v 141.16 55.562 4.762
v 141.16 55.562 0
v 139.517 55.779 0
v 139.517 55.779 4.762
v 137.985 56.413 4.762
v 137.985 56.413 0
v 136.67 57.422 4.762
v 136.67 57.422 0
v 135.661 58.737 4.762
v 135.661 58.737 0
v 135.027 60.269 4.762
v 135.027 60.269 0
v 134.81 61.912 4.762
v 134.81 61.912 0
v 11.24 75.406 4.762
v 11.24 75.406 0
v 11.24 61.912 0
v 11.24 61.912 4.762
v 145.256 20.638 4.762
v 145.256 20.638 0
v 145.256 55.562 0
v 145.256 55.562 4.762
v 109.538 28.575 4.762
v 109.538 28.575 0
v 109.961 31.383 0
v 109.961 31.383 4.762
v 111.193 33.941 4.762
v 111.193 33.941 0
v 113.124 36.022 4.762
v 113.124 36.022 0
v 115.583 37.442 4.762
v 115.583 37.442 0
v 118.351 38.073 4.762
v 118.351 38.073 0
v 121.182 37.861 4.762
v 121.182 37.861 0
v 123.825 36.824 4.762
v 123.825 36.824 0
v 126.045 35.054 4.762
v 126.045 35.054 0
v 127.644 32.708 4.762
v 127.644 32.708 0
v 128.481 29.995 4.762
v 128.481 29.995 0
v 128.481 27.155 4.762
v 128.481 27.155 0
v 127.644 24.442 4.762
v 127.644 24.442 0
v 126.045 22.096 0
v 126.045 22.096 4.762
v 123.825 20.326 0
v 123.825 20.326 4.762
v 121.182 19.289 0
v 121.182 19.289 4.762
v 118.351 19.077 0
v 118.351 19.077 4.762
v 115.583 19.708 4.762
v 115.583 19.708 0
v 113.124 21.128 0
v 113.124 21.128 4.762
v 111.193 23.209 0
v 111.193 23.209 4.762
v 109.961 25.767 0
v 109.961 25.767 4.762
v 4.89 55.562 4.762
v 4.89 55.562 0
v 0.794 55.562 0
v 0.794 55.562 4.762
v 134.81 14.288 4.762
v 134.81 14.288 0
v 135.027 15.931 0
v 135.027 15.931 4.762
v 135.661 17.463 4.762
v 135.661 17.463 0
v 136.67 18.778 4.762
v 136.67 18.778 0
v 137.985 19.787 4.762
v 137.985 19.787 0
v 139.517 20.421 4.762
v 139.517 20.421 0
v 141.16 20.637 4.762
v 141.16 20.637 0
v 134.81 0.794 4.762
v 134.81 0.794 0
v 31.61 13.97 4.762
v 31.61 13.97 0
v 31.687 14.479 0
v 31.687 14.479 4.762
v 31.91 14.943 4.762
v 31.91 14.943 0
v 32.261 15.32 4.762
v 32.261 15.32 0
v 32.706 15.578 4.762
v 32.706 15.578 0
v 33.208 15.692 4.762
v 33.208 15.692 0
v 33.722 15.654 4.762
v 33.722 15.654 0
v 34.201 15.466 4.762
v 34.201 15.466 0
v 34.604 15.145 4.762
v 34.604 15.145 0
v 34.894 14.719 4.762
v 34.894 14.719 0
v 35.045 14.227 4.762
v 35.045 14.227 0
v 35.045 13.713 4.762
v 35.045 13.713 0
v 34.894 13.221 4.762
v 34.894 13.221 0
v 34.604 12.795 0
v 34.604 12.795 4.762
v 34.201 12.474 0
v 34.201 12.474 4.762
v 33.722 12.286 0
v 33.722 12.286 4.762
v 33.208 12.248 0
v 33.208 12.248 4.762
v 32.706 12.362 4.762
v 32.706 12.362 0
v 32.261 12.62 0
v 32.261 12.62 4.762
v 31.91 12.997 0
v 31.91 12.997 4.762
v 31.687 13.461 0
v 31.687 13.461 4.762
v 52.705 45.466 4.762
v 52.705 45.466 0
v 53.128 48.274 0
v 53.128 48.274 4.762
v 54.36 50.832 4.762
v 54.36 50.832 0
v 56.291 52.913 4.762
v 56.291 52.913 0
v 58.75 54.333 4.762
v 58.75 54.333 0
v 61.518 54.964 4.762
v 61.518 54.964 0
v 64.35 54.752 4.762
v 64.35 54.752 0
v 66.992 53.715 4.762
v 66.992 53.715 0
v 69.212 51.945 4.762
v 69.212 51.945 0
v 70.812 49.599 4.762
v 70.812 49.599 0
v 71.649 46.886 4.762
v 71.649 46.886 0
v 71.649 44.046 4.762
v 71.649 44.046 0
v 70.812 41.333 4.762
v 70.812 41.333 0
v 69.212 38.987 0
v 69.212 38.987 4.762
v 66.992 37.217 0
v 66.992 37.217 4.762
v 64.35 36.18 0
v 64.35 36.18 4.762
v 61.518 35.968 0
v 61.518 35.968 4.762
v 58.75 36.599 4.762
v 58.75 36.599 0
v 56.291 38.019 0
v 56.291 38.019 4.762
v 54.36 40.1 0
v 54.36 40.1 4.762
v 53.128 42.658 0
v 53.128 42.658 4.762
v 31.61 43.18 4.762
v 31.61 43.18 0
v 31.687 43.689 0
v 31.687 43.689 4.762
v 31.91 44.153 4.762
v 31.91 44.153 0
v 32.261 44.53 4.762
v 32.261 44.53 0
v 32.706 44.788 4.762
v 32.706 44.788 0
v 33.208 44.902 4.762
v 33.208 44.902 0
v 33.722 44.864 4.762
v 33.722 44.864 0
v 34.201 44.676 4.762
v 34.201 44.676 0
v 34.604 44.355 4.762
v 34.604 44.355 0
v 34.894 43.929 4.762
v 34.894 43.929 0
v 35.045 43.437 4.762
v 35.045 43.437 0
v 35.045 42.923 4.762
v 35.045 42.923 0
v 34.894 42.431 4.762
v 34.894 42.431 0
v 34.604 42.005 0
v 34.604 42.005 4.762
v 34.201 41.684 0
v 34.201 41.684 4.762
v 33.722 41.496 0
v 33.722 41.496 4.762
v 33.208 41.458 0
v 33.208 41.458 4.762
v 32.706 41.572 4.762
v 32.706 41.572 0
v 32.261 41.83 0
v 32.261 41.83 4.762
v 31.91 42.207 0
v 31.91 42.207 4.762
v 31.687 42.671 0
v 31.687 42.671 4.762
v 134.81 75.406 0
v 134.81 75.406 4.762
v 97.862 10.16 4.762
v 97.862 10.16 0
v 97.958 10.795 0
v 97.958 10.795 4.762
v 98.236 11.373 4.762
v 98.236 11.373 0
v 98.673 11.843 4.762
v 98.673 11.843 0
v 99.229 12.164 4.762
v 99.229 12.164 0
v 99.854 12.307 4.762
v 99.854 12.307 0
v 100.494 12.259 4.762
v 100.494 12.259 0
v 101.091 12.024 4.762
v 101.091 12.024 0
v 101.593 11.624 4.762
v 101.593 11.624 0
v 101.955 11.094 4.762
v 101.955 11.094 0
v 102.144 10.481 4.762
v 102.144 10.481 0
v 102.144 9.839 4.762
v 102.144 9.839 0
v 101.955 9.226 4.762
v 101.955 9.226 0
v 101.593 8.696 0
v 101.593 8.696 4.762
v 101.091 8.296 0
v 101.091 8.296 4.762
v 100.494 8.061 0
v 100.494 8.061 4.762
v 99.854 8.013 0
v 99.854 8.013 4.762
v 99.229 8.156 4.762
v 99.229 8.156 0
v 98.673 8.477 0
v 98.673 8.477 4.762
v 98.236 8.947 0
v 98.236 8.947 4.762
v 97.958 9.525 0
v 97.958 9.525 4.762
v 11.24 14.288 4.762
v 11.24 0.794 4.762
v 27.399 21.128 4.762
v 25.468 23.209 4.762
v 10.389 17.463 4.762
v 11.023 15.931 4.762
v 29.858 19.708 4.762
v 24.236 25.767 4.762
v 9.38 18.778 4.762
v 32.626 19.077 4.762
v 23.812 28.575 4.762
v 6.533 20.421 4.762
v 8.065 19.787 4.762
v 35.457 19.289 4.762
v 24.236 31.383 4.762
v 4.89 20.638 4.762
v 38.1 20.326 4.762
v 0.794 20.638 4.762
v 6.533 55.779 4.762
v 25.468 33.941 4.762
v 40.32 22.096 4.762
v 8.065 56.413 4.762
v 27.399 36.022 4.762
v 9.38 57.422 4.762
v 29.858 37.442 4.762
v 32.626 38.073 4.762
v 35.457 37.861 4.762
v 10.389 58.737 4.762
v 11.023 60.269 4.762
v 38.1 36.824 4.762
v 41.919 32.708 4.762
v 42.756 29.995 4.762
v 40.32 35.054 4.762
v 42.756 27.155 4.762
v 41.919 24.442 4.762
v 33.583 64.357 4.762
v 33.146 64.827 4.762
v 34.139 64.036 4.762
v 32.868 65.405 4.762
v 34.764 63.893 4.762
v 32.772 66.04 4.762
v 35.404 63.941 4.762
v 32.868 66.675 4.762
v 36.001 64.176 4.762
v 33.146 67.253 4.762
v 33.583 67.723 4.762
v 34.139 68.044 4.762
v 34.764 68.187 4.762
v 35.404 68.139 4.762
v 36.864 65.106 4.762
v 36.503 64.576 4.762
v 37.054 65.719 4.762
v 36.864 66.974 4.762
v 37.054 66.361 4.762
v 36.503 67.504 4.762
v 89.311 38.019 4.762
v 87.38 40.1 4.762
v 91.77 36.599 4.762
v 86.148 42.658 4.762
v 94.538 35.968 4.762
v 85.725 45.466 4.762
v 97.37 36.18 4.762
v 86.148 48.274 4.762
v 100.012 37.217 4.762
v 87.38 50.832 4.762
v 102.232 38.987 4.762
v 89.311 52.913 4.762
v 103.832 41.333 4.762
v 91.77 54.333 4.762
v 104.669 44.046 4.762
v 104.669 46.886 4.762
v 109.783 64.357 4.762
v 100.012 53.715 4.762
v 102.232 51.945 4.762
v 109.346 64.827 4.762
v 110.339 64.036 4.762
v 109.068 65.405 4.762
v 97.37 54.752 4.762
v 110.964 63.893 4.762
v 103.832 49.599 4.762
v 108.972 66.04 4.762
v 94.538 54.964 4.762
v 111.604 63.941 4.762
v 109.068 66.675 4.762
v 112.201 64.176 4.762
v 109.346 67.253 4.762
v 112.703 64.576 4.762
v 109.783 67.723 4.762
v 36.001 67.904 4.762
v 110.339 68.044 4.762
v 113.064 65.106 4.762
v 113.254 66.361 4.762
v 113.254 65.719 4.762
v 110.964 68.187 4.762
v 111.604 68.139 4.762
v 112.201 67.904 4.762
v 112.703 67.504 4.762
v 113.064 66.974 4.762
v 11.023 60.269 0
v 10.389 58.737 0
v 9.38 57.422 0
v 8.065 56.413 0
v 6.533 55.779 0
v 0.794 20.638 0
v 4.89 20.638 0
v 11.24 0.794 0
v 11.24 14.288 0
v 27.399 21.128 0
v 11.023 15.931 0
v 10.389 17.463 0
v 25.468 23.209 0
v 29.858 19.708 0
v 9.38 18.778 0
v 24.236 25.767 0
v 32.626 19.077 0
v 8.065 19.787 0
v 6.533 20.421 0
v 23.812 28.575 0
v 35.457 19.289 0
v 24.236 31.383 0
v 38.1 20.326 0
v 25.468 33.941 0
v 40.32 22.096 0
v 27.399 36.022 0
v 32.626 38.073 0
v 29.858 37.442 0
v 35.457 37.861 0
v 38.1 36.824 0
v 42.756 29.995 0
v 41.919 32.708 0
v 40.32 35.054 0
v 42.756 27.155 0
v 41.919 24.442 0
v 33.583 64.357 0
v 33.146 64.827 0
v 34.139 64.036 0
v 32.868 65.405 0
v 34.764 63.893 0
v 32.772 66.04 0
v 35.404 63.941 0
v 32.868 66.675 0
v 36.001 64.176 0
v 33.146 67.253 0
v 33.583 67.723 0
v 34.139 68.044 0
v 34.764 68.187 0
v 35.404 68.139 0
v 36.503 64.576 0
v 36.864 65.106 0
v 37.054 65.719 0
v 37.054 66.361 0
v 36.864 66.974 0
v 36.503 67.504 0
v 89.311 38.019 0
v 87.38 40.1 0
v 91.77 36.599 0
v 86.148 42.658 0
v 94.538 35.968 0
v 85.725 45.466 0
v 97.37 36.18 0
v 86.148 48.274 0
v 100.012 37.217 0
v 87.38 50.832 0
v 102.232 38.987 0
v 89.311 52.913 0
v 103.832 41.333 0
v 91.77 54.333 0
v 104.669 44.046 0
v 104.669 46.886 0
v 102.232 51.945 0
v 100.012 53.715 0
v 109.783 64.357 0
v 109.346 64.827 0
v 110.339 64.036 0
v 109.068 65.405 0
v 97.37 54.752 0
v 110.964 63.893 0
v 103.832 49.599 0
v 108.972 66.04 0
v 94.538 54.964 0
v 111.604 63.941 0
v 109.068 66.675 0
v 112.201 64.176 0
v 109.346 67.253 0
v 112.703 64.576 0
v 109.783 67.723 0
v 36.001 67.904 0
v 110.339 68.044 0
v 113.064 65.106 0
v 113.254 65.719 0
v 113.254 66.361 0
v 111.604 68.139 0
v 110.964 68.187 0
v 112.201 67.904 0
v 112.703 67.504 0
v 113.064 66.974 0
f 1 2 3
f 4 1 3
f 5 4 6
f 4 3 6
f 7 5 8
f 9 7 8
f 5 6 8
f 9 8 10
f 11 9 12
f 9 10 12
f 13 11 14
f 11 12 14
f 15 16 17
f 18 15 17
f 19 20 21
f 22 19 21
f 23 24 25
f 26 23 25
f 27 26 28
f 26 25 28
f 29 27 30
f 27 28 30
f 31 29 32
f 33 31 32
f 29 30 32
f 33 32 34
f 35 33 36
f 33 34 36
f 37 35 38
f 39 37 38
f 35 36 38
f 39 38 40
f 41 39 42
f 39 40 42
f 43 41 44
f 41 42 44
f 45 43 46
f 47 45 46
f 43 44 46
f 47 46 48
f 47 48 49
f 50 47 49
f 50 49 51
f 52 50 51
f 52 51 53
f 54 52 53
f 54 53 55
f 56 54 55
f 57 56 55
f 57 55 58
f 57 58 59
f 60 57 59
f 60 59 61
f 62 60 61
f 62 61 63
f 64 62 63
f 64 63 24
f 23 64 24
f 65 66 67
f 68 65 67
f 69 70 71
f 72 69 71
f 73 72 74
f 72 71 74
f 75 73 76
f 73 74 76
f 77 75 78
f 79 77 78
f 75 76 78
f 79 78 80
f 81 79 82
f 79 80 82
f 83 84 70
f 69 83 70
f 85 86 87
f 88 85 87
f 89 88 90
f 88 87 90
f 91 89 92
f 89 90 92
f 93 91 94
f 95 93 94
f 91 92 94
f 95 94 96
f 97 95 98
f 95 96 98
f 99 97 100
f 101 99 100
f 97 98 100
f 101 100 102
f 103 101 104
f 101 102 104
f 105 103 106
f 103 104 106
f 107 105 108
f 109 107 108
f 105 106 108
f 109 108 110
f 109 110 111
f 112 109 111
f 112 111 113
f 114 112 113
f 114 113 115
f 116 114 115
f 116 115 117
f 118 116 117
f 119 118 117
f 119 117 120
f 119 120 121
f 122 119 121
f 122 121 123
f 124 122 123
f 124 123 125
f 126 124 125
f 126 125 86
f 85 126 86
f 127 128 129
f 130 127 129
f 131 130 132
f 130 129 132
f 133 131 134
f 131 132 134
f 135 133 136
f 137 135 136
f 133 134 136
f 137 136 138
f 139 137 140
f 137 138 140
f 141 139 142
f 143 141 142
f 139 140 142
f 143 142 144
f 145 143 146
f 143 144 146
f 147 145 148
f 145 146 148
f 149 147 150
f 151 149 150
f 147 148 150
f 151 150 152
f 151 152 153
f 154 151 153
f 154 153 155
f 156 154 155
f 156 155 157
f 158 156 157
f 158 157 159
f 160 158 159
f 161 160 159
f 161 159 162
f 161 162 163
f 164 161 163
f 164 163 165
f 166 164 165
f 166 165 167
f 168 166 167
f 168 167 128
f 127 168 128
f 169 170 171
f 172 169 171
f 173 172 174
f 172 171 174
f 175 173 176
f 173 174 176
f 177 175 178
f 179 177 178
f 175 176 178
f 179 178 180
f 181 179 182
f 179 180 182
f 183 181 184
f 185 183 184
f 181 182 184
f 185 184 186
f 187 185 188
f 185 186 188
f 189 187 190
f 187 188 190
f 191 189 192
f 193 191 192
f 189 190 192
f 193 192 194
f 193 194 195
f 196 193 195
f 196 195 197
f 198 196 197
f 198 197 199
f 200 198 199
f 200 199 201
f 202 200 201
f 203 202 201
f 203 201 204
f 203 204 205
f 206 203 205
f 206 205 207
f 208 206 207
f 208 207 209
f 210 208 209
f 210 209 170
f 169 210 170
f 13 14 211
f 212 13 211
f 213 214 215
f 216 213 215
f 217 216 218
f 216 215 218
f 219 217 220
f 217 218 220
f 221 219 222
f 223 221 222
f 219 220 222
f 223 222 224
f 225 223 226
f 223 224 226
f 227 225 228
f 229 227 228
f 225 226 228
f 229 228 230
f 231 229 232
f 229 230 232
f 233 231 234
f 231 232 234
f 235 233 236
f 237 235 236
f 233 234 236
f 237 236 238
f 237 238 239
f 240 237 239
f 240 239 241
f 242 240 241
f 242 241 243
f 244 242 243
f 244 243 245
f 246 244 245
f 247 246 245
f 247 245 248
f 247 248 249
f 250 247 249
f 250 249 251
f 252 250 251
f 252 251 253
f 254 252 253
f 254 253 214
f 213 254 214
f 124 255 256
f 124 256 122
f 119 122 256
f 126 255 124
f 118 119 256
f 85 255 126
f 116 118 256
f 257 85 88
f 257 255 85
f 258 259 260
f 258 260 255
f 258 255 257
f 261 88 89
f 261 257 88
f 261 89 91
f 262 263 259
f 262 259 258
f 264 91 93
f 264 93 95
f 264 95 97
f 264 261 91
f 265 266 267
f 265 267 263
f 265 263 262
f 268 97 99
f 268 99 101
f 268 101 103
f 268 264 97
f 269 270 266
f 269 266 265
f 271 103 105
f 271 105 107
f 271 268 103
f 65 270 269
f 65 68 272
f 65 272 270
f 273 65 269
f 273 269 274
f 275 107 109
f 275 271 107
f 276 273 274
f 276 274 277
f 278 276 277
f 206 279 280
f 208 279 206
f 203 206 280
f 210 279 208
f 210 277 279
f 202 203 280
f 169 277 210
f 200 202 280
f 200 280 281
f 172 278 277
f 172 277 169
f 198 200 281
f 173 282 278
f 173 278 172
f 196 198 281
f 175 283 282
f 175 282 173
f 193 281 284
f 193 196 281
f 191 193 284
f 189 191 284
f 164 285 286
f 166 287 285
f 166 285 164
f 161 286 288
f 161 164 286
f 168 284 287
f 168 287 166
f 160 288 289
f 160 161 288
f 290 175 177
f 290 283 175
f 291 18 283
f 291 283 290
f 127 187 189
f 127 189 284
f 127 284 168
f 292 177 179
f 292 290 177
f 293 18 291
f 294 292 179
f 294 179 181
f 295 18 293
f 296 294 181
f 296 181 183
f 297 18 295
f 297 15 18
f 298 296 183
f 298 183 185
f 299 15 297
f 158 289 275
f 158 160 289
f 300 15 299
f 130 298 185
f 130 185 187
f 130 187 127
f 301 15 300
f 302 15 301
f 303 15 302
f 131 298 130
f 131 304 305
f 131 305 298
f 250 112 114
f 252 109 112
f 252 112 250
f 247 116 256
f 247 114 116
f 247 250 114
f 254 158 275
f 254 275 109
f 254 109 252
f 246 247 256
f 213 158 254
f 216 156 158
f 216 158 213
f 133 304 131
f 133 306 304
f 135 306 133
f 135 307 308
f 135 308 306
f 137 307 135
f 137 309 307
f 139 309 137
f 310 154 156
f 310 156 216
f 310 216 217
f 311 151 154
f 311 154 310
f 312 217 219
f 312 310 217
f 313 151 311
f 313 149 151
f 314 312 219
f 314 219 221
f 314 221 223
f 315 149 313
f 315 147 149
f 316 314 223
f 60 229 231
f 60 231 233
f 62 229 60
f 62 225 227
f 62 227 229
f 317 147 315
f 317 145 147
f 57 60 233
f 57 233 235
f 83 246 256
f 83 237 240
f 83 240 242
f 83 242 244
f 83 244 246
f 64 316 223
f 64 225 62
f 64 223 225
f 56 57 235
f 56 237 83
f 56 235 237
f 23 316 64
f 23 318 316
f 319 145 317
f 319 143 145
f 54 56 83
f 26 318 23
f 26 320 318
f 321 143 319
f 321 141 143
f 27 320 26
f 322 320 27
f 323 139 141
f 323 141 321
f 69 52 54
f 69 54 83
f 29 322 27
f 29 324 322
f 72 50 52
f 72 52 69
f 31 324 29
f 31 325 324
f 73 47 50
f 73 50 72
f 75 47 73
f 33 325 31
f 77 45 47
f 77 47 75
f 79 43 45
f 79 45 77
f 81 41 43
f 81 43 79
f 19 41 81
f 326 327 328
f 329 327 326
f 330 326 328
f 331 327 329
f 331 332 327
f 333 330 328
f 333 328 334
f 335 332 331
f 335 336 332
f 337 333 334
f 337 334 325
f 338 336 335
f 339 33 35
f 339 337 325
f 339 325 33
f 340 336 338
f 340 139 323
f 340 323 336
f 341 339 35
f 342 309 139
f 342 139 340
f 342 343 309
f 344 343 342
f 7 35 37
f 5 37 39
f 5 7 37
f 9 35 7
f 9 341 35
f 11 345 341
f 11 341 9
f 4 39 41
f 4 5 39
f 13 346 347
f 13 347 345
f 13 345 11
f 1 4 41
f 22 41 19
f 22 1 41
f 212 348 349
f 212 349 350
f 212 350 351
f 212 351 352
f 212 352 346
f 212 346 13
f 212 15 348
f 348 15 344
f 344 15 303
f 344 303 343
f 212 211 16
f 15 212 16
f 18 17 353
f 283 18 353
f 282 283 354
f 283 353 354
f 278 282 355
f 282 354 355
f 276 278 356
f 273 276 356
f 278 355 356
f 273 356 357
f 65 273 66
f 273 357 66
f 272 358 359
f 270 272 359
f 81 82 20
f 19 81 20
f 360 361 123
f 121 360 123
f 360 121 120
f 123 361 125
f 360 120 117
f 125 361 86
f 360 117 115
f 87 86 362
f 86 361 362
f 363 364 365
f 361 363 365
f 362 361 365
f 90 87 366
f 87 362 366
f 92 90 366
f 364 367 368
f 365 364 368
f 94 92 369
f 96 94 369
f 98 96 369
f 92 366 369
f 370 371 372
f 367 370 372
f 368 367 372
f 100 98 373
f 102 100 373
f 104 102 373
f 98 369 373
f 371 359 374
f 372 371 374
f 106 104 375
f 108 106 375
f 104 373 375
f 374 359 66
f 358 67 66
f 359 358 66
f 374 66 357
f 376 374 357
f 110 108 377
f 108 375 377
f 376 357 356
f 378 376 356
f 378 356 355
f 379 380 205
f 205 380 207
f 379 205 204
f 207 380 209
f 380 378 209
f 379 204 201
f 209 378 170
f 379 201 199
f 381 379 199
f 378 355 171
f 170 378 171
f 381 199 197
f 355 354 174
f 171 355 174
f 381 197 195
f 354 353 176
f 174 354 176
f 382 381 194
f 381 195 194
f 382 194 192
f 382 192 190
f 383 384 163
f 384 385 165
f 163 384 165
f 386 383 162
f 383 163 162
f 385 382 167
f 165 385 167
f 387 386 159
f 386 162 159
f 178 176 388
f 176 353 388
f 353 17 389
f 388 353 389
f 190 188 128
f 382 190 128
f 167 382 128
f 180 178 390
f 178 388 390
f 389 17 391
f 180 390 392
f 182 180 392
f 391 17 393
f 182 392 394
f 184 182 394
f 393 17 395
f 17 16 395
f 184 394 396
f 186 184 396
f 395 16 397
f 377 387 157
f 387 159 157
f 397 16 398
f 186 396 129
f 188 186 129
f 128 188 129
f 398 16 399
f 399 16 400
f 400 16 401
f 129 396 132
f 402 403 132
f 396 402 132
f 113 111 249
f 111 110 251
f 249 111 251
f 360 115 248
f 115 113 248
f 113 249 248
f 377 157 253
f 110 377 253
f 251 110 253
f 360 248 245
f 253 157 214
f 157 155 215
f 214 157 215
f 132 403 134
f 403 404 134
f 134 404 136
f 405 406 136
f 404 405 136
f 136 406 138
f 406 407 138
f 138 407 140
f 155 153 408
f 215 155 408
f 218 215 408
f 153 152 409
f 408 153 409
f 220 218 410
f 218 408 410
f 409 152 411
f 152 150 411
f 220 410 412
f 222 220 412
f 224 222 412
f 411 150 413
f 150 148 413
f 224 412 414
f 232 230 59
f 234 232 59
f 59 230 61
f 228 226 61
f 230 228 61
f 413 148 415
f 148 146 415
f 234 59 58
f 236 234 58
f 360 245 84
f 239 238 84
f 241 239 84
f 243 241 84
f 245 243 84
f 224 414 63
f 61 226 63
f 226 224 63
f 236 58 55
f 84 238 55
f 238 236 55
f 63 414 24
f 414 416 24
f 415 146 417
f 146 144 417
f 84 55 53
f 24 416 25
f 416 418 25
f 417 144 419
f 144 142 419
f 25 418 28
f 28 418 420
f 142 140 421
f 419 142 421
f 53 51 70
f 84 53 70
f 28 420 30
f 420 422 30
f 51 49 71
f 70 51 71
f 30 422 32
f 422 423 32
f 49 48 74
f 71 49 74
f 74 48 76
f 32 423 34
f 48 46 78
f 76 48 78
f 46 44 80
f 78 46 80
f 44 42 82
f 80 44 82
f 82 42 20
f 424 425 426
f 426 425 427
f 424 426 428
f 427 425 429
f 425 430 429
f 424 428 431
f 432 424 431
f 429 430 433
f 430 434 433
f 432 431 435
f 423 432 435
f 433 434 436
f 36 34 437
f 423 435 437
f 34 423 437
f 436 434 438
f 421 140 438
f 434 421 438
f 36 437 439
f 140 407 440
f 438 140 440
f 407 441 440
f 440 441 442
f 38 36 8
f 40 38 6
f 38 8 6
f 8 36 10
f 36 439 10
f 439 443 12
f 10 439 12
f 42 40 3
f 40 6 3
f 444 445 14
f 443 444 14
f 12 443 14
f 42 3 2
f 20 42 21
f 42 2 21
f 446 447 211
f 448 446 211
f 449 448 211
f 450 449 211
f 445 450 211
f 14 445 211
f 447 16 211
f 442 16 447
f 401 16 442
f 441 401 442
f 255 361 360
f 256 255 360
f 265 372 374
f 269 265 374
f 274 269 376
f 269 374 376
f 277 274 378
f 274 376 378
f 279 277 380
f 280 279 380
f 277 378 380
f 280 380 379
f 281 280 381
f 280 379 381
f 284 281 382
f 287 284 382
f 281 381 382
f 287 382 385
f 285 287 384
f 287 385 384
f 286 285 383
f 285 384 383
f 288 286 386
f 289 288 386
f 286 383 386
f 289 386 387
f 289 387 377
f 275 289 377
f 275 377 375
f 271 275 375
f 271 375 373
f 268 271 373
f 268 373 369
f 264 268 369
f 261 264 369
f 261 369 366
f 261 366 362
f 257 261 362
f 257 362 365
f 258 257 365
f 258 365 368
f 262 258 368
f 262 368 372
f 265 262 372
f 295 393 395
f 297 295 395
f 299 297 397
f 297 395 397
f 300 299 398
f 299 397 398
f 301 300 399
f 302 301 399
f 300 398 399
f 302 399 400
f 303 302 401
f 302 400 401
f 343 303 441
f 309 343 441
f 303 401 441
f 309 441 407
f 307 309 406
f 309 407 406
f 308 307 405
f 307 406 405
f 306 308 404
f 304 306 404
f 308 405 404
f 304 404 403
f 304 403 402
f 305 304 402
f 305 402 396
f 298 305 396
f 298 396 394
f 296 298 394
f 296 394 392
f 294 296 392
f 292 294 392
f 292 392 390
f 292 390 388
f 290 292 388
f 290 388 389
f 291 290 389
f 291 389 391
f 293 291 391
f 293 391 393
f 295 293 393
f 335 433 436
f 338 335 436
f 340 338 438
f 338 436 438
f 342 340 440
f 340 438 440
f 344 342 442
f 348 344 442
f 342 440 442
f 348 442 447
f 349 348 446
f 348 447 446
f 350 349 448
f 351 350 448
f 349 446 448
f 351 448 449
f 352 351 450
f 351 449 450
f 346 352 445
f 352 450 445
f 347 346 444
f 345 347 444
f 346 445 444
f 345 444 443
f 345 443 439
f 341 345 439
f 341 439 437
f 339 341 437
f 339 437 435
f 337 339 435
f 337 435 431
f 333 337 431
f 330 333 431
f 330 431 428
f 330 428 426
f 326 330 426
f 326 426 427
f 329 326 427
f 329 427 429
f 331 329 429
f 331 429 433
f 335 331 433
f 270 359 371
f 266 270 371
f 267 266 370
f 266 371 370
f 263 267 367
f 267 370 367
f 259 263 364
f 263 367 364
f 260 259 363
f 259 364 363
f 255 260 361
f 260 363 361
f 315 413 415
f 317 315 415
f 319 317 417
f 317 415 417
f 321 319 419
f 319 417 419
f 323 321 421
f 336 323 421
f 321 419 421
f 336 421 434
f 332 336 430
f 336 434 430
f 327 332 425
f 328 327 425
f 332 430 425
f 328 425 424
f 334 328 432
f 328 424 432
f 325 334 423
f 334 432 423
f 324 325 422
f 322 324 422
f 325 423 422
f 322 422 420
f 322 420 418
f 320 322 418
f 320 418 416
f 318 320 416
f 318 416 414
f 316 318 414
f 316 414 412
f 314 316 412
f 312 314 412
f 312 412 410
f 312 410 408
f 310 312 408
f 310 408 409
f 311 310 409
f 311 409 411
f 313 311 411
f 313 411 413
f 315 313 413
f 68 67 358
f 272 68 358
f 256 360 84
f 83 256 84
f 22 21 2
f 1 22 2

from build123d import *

# Parameters (mm, degrees)
BOSS_EXTRUDE1_DEPTH         = 4.7625
F_4_CLEARANCE_HOLE1_D       = 3.4544
F_6_CLEARANCE_HOLE1_D       = 4.3053
F_3_4_0_75_DIAMETER_HOLE1_D = 19.05


with BuildPart() as part:
    # Sketch1 → Boss-Extrude1 (new body)
    with BuildSketch(Plane.XY):
        with BuildLine():
            Line((11.2395, 14.2875), (11.2395, 0.79375))
            Line((11.2395, 0.79375), (134.8105, 0.79375))
            Line((134.8105, 0.79375), (134.8105, 14.2875))
            ThreePointArc((134.8105, 14.2875), (136.670371939, 18.777628061), (141.1605, 20.6375))
            Line((141.1605, 20.6375), (145.25625, 20.6375))
            Line((145.25625, 20.6375), (145.25625, 55.5625))
            Line((145.25625, 55.5625), (141.1605, 55.5625))
            ThreePointArc((141.1605, 55.5625), (136.670371939, 57.422371939), (134.8105, 61.9125))
            Line((134.8105, 61.9125), (134.8105, 75.40625))
            Line((134.8105, 75.40625), (11.2395, 75.40625))
            Line((11.2395, 75.40625), (11.2395, 61.9125))
            ThreePointArc((11.2395, 61.9125), (9.379628061, 57.422371939), (4.8895, 55.5625))
            Line((4.8895, 55.5625), (0.79375, 55.5625))
            Line((0.79375, 55.5625), (0.79375, 20.6375))
            Line((0.79375, 20.6375), (4.8895, 20.6375))
            ThreePointArc((4.8895, 20.6375), (9.379628061, 18.777628061), (11.2395, 14.2875))
        make_face()
    extrude(amount=BOSS_EXTRUDE1_DEPTH)

    # #4 Clearance Hole1 (through all)
    with Locations(Plane.XY.offset(4.7625)):
        with Locations((33.3375, 43.18), (33.3375, 13.97)):
            Hole(F_4_CLEARANCE_HOLE1_D / 2)

    # #6 Clearance Hole1 (through all)
    with Locations(Plane.XY.offset(4.7625)):
        with Locations((34.925, 66.04), (111.125, 66.04), (100.01504, 10.16)):
            Hole(F_6_CLEARANCE_HOLE1_D / 2)

    # 3/4 (0.75) Diameter Hole1 (through all)
    with Locations(Plane.XY.offset(4.7625)):
        with Locations((119.0625, 28.575), (95.25, 45.466), (62.23, 45.466), (33.3375, 28.575)):
            Hole(F_3_4_0_75_DIAMETER_HOLE1_D / 2)


solid = part.part
